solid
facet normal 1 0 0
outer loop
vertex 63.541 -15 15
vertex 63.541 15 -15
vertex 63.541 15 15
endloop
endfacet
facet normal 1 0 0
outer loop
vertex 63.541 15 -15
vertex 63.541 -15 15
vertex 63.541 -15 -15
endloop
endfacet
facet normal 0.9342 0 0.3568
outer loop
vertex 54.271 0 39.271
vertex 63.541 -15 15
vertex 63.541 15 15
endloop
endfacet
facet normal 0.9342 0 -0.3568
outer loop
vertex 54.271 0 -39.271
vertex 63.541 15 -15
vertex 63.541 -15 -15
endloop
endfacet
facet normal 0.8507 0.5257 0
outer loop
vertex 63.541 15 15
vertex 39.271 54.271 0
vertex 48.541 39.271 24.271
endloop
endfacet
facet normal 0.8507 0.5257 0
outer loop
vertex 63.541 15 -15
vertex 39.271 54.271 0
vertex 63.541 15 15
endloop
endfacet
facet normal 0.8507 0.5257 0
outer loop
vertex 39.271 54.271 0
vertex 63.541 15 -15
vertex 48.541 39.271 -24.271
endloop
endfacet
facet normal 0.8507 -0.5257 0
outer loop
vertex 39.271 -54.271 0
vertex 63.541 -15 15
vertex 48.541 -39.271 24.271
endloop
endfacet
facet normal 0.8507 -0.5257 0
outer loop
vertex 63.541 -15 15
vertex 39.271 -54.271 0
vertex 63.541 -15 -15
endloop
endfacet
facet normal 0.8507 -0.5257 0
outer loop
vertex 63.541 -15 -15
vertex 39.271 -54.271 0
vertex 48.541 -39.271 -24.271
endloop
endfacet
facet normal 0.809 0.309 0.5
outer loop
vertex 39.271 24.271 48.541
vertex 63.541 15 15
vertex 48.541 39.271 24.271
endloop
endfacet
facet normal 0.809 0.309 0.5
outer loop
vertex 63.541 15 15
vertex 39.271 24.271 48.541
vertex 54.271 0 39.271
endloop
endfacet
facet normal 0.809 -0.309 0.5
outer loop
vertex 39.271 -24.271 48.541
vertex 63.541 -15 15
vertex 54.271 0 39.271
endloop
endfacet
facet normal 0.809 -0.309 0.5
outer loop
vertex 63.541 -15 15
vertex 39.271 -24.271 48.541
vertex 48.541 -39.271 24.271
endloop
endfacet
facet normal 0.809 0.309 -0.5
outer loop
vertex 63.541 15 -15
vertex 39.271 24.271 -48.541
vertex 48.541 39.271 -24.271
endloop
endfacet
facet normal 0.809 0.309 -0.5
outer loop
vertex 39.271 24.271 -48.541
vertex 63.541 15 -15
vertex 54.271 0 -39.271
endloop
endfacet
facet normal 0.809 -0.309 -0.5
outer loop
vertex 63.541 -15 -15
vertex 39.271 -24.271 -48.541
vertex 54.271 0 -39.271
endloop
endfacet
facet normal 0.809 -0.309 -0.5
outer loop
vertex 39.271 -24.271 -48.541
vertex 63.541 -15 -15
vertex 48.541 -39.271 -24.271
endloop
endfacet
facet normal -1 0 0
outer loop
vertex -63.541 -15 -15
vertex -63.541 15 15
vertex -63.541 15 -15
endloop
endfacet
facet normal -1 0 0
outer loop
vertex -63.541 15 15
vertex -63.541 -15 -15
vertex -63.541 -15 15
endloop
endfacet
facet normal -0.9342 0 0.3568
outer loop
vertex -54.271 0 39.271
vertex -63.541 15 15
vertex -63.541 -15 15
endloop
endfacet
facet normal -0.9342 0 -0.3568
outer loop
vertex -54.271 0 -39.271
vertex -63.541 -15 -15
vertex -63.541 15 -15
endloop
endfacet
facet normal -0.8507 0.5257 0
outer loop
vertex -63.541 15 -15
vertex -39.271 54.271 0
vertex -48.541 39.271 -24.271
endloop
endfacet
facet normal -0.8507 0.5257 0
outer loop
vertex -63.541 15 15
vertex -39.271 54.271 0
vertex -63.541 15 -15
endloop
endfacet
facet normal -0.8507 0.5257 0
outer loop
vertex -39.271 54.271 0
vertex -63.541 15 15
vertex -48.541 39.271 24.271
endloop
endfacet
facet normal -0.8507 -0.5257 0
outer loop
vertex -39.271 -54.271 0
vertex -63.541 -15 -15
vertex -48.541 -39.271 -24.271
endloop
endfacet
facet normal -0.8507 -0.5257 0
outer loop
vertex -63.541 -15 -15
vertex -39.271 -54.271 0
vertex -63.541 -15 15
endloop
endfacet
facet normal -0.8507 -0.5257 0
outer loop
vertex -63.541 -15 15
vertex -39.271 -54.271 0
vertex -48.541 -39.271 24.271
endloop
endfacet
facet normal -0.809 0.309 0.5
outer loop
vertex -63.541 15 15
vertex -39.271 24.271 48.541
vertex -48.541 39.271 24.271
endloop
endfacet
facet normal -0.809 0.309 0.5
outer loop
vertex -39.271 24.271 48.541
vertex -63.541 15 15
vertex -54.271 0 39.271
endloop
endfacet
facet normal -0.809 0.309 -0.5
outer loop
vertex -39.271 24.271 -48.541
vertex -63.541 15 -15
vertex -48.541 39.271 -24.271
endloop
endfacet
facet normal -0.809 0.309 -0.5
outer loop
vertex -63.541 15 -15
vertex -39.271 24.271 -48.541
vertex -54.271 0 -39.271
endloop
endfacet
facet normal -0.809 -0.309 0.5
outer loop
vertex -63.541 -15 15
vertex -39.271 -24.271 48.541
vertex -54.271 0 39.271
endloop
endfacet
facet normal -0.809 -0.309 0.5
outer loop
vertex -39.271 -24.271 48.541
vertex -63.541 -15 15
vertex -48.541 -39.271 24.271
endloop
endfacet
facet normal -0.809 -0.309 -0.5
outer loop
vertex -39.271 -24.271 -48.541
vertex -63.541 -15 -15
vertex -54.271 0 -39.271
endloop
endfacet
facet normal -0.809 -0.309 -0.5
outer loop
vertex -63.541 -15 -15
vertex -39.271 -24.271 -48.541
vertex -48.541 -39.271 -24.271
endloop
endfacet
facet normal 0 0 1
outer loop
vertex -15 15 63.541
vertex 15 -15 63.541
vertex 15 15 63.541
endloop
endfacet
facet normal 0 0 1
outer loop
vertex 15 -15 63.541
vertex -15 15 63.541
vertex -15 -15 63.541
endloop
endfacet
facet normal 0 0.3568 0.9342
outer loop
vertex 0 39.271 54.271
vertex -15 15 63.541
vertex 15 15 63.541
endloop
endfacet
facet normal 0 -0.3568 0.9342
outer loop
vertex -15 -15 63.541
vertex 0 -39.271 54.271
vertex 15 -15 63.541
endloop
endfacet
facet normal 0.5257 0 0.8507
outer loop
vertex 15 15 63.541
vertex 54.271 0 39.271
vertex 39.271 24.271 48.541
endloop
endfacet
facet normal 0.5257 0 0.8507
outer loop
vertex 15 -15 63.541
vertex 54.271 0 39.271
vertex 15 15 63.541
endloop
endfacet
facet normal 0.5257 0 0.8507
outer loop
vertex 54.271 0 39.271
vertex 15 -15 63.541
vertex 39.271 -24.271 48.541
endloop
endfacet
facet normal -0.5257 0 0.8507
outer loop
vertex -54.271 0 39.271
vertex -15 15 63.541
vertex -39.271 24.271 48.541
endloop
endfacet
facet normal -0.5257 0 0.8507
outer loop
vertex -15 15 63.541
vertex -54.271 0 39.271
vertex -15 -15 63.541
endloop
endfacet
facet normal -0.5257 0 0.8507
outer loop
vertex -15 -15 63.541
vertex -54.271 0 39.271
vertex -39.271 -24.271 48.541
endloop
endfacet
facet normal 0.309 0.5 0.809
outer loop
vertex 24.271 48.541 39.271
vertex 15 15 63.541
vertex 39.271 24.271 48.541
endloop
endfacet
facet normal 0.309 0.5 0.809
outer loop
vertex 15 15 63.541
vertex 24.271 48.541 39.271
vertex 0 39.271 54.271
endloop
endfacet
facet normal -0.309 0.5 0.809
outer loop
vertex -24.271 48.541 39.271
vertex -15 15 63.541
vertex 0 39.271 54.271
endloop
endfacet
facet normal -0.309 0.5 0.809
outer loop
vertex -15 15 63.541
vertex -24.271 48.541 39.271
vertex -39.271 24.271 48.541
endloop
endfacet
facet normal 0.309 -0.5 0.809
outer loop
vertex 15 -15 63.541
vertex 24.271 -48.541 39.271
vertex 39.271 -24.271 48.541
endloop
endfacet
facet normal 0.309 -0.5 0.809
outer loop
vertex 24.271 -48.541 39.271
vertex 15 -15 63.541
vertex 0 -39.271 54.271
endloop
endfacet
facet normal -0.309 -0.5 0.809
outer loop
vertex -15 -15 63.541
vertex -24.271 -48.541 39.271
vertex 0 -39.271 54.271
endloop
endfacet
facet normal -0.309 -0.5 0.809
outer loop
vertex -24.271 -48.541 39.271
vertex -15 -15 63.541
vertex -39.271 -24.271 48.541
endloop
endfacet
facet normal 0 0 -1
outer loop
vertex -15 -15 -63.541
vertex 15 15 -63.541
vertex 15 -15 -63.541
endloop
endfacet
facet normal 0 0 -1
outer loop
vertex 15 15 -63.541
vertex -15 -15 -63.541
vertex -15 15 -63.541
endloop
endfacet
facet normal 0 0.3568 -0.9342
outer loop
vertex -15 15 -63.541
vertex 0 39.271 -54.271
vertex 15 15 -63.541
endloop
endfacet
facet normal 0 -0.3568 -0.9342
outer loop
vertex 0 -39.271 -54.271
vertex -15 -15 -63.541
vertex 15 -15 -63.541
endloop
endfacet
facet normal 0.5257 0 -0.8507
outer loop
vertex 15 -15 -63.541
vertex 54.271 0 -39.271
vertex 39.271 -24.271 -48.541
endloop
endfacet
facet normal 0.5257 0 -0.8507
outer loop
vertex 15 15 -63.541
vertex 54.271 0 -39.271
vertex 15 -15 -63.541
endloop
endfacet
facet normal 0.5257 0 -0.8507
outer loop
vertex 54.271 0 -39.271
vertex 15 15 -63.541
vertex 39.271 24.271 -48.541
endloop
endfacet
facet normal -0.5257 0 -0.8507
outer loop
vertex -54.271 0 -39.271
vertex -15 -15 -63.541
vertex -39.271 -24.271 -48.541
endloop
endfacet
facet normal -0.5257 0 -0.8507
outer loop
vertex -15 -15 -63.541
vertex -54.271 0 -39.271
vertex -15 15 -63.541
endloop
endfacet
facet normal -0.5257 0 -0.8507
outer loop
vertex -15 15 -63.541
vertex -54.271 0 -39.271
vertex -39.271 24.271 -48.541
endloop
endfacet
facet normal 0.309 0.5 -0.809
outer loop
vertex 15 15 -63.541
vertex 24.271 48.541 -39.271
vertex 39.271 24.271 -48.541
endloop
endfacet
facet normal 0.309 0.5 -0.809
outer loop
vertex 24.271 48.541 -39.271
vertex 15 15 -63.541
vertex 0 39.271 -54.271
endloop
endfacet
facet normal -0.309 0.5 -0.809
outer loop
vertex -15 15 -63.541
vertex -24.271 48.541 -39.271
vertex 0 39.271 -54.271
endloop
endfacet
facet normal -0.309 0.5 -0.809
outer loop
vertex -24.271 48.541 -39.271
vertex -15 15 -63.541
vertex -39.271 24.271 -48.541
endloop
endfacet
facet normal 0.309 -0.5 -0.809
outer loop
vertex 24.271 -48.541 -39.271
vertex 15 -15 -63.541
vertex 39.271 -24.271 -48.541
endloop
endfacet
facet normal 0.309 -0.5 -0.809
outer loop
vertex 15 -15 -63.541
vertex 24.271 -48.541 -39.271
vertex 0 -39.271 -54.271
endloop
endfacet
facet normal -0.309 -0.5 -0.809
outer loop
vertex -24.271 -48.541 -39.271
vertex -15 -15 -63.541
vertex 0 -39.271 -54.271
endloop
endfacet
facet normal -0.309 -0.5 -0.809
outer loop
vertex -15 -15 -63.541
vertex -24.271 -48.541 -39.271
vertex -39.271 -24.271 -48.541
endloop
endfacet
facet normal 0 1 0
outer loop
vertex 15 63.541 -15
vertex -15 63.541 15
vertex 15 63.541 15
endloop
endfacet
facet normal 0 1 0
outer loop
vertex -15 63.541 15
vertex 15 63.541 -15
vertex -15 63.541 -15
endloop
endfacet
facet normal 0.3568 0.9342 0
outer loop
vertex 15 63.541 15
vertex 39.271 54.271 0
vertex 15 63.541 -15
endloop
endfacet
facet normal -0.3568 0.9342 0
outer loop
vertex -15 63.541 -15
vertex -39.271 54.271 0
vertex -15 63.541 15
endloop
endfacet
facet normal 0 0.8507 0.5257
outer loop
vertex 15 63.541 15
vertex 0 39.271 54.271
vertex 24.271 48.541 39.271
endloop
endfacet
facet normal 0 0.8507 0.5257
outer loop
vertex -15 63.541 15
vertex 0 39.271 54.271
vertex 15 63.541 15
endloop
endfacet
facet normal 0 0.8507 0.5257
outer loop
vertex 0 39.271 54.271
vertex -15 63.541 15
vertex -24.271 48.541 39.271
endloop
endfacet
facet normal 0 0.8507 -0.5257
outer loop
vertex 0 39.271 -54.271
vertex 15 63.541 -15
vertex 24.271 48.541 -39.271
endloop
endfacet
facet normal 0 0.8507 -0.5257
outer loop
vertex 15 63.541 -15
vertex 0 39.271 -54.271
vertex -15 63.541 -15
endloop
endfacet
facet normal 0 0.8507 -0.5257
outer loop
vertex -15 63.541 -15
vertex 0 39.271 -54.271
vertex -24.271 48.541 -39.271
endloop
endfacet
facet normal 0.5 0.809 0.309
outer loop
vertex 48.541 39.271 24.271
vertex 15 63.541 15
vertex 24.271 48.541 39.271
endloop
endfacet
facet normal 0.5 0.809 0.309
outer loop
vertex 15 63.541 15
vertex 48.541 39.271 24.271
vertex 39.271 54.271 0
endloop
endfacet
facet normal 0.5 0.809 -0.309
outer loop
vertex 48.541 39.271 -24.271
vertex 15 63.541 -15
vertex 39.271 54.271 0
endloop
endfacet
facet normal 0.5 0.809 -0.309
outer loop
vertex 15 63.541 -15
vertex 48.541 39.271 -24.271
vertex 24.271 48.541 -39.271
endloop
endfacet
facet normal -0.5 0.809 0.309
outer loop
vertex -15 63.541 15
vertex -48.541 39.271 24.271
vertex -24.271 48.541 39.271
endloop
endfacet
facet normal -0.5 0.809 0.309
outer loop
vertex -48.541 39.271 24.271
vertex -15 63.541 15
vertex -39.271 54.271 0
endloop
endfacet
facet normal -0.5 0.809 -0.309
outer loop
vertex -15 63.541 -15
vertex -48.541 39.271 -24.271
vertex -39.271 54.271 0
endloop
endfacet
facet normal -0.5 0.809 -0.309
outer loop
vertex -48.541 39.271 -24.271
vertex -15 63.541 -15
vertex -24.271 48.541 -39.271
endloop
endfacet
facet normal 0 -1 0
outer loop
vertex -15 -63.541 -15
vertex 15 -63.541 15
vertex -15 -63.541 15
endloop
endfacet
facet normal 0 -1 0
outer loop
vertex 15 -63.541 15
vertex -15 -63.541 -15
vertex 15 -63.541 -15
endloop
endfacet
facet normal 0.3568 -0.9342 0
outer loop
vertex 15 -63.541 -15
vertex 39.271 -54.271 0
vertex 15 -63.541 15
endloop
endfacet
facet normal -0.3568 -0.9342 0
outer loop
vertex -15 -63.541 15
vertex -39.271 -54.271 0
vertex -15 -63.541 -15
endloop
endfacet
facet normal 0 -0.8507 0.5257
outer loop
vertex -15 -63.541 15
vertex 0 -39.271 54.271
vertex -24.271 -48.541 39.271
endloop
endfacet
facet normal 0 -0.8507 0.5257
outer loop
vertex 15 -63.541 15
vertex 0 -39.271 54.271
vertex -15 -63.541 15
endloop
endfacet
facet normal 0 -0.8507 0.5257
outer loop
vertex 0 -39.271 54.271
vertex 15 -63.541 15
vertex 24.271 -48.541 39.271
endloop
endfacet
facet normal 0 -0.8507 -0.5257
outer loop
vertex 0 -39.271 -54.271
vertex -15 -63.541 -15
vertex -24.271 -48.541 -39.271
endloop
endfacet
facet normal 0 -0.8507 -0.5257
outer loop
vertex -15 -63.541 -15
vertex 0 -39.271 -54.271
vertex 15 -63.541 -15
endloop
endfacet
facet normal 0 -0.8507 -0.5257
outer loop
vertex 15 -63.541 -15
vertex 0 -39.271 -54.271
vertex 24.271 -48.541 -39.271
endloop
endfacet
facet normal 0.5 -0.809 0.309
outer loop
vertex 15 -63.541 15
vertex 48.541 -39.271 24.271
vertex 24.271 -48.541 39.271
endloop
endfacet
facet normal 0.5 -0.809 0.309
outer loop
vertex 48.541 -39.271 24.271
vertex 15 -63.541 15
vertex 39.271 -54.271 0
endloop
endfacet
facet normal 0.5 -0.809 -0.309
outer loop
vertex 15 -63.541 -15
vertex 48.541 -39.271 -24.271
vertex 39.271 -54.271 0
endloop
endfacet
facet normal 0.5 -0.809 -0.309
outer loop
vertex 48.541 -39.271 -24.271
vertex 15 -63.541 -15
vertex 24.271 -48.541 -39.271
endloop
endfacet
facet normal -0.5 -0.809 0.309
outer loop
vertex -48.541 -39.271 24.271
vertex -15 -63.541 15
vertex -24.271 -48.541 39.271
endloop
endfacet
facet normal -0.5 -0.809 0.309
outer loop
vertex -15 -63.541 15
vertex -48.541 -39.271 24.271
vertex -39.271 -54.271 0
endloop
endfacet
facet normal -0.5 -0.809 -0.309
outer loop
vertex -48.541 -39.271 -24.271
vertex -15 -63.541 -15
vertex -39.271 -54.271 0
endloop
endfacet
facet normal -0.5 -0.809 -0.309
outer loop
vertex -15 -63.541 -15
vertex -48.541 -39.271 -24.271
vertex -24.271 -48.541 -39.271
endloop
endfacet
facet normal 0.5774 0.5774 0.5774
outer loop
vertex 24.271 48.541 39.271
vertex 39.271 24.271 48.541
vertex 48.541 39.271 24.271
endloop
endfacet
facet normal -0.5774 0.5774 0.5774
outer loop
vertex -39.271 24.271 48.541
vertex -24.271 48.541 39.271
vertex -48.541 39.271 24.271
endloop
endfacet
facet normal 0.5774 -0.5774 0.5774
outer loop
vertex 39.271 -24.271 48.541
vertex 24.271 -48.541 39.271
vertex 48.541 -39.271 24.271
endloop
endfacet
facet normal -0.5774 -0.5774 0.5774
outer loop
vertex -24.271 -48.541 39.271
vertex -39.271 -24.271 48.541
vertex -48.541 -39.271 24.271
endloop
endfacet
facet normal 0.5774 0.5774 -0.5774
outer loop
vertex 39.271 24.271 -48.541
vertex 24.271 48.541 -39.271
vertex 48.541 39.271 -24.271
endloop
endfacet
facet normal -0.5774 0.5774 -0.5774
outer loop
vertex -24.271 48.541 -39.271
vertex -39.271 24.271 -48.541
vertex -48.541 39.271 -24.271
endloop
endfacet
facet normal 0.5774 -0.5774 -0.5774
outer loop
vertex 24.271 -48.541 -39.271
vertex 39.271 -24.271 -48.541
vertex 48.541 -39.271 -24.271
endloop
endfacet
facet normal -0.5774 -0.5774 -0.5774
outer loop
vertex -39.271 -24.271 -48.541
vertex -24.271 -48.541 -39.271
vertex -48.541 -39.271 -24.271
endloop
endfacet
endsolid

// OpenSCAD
// Rhombicosidodecahedron
// (C) @oblomobka - 2023.09
// GPL license

/* **CUSTOMIZER VARIABLES** */
// Edge
edge = 30; // [10:100]
// Center of the solid or stand over a face
position = "Center"; // ["Center", "Face"]

module Rhombicosidodecahedron ( edge = 30, position="Face"){  // eD
    // Constants
    phi = (1+sqrt(5))/2; // Golden ratio = 1,618...
    
    // Relations
    rCirRhombicosidodecahedron = sqrt(8*phi+7)/2;   // radius of a circumscribed sphere for edge = 1 / = 2,233
    rInsSquare = sqrt(8*phi+5)/2;                   // Distance from center os polyhedron to center of square for edge = 1 / =2,118
    rInsPentagon = sqrt((45 + 18*sqrt(5))/20);      // Distance from center os polyhedron to center of pentagon for edge = 1 / =2,065
    //hPentagon = sqrt(5+2*sqrt(5))/2;
    //rPentagon = sqrt((5+sqrt(5))/10);
    
    // Dihedral angles
    diAngleTriSqu = 180 - atan((3-sqrt(5))/2); // dihedral angle triangular-square faces = 159,09°
    diAngleSquPent = 180 - atan((sqrt(5)-1)/2); // dihedral angle square-pentagonal faces = 148.28°
    
    // Variables
    s = edge/2;
    // define 3 rectangles on plane XY/XZ/YZ. For Triangles
    pT1 = (1 * phi^2) * s;
    pT2 = (2 + phi) * s;
    // define 3 boxes. Every point in one octant. For Squares
    bS1 = (1 * phi^3) * s;
    bS2 = 1 * s;
    bS3 = 1 * s;
    // define 3 boxes. Every point in one octant. For Pentagons
    bP1 = (2 * phi) * s;
    bP2 = (1 * phi^2) * s;
    bP3 = (1 * phi) * s;
    
    
    // Definition of points and faces V = 60 / F = 62 ( 20 triangles + 30 squares + 12 pentagons )
    // Even permutations of (±(2+φ), 0, ±φ^2) and(±φ^3, ±1, ±1) and (±2φ, ±φ^2, ±φ)
    
    eDpoints = [
    
        // Build 3 rectangles on plane XY/XZ/YZ
        [+pT1, +pT2,   0], [-pT1, +pT2,   0], [+pT1, -pT2,   0], [-pT1, -pT2,   0],    // XY    [  0 -  3]
        [+pT2,   0, +pT1], [+pT2,   0, -pT1], [-pT2,   0, +pT1], [-pT2,   0, -pT1],    // XZ    [  4 -  7]
        [0,   +pT1, +pT2], [0,   -pT1, +pT2], [0,   +pT1, -pT2], [0,   -pT1, -pT2],    // XZ    [  8 - 11]
        
        // build 3 boxes. Every point in one octant
        [+bS1, +bS2, +bS3], [-bS1, +bS2, +bS3], [+bS1, -bS2, +bS3], [-bS1, -bS2, +bS3],    // XYZ by size - UP side       [ 12 - 15]
        [+bS1, +bS2, -bS3], [-bS1, +bS2, -bS3], [+bS1, -bS2, -bS3], [-bS1, -bS2, -bS3],    // XYZ by size - DOWN side     [ 16 - 19]
        
        [+bS2, +bS3, +bS1], [+bS2, +bS3, -bS1], [-bS2, +bS3, +bS1], [-bS2, +bS3, -bS1],    // YZX by size - UP side       [ 20 - 23]
        [+bS2, -bS3, +bS1], [+bS2, -bS3, -bS1], [-bS2, -bS3, +bS1], [-bS2, -bS3, -bS1],    // YZX by size - Down side     [ 24 - 27]
        
        [+bS3, +bS1, +bS2], [+bS3, -bS1, +bS2], [+bS3, +bS1, -bS2], [+bS3, -bS1, -bS2],    // ZXY by size - UP side       [ 28 - 31]
        [-bS3, +bS1, +bS2], [-bS3, -bS1, +bS2], [-bS3, +bS1, -bS2], [-bS3, -bS1, -bS2],    // ZXY by size - DOWN side     [ 32 - 35]
        
        // build 3 boxes. Every point in one octant
        [+bP1, +bP2, +bP3], [-bP1, +bP2, +bP3], [+bP1, -bP2, +bP3], [-bP1, -bP2, +bP3],    //   36  37  38  39
        [+bP1, +bP2, -bP3], [-bP1, +bP2, -bP3], [+bP1, -bP2, -bP3], [-bP1, -bP2, -bP3],    //   40  41  42  43    
        
        [+bP2, +bP3, +bP1], [+bP2, +bP3, -bP1], [-bP2, +bP3, +bP1], [-bP2, +bP3, -bP1],    //   44  45  46  47
        [+bP2, -bP3, +bP1], [+bP2, -bP3, -bP1], [-bP2, -bP3, +bP1], [-bP2, -bP3, -bP1],    //   48  49  50  51  
        
        [+bP3, +bP1, +bP2], [+bP3, -bP1, +bP2], [+bP3, +bP1, -bP2], [+bP3, -bP1, -bP2],    //   52  53  54  55  
        [-bP3, +bP1, +bP2], [-bP3, -bP1, +bP2], [-bP3, +bP1, -bP2], [-bP3, -bP1, -bP2]     //   56  57  58  59  
        
        ];
         
    eDfaces = [
        // Caps centred on the axis ( 5 squares + 2 triangles + 2 pentagons
        // + X
        [ 12, 16, 18, 14],                              // Central square on the axis
        [ 12, 14,  4], [ 18, 16,  5],                   // Triangles adjacent to central square
        [ 12, 36, 0, 40, 16], [ 14, 18, 42,  2, 38],    // Pentagons adjacent to central square
        [ 12,  4, 44, 36], [ 14, 38, 48,  4],           // Squares touching vertices of the central square - +Z
        [ 16, 40, 45,  5], [ 18,  5, 49, 42],           // Squares touching vertices of the central square - -Z
        
        // - X
        [ 13, 15, 19, 17],                              
        [ 15, 13,  6], [ 17, 19,  7],                   
        [ 13, 17, 41,  1, 37], [ 19, 15, 39,  3, 43],   
        [ 13, 37, 46,  6], [ 17,  7, 47, 41],           // +Z
        [ 15,  6, 50, 39], [ 19, 43, 51,  7],           // -Z
        
        // + Z
        [ 20, 24, 26, 22],                              
        [ 20, 22,  8], [ 24,  9, 26],                   
        [ 20, 44,  4, 48, 24], [ 22, 26, 50,  6, 46],   
        [ 20,  8, 52, 44], [ 22, 46, 56,  8],           // +Y
        [ 24, 48, 53,  9], [ 26,  9, 57, 50],           // -Y
        
        // - Z
        [ 21, 23, 27, 25],                             
        [ 21, 10, 23], [ 25, 27, 11],                   
        [ 21, 25, 49,  5, 45], [ 23, 47,  7, 51, 27],   
        [ 21, 45, 54, 10], [ 23, 10, 58, 47],           // +Y
        [ 25, 11, 55, 49], [ 27, 51, 59, 11],           // -Y
        
        // + Y
        [ 28, 32, 34, 30],                              
        [ 30,  0, 28], [ 32,  1, 34],                   
        [ 28, 52,  8, 56, 32], [ 34, 58, 10, 54, 30],   
        [ 28,  0, 36, 52], [ 30, 54, 40,  0],           // +X
        [ 32, 56, 37,  1], [ 34,  1, 41, 58],           // -X
        
        // - Y
        [ 29, 31, 35, 33],                              
        [ 29,  2, 31], [ 35,  3, 33],                   
        [ 33, 57,  9, 53, 29], [ 31, 55, 11, 59, 35],   
        [ 29, 53, 38,  2], [ 31,  2, 42, 55],           // +X
        [ 33,  3, 39, 57], [ 35, 59, 43,  3],           // -X
        
        // 8 Triangles on the corners (octants)
        [ 36, 44, 52], [ 37, 56, 46], [ 38, 53, 48], [ 39, 50, 57],
        [ 40, 54, 45], [ 41, 47, 58], [ 42, 49, 55], [ 43, 59, 51]
                
        ];
        
        // Helpers
        planes = [
            [  0,  1,  3,  2],
            [  4,  5,  7,  6],
            [  8,  9, 11, 10]
            ];        
         box1 = [
            [ 12, 13, 15, 14], [ 16, 17, 19, 18],
            [ 20, 21, 23, 22], [ 24, 25, 27, 26],
            [ 28, 29, 31, 30], [ 32, 33, 35, 34]
            ];
         box2 = [
            [ 36, 37, 39, 38], [ 40, 41, 43, 42],
            [ 44, 45, 47, 46], [ 48, 49, 51, 50],
            [ 52, 53, 55, 54], [ 56, 57, 59, 58]
            ];
            
          /*color("red", 0.4){ polyhedron ( eDpoints, planes); }
            color("blue", 0.4){ polyhedron ( eDpoints, box1); }
            color("green", 0.4){ polyhedron ( eDpoints, box2); }*/
    
    // Polyhedron stands on xy plane centered on the center of the face or centered on the center of polyhedron
    if ( position == "Face"){
        translate ([ 0, 0, 1*edge*rInsPentagon+0*edge*rInsSquare])
            rotate ([ 0*diAngleTriSqu, 1*diAngleSquPent, 0])
                polyhedron ( eDpoints, eDfaces);
            //color("red", 0.4){ sphere (edge*rCirRhombicosidodecahedron);}
            
        }
        
    else if ( position == "Center") {
        polyhedron ( eDpoints, eDfaces);
        //color("red", 0.4){ sphere (edge*rCirRhombicosidodecahedron);}      
        }

}
/* **RENDERING OF SOLIDS** */
Rhombicosidodecahedron ( edge = edge, position = position);
    
